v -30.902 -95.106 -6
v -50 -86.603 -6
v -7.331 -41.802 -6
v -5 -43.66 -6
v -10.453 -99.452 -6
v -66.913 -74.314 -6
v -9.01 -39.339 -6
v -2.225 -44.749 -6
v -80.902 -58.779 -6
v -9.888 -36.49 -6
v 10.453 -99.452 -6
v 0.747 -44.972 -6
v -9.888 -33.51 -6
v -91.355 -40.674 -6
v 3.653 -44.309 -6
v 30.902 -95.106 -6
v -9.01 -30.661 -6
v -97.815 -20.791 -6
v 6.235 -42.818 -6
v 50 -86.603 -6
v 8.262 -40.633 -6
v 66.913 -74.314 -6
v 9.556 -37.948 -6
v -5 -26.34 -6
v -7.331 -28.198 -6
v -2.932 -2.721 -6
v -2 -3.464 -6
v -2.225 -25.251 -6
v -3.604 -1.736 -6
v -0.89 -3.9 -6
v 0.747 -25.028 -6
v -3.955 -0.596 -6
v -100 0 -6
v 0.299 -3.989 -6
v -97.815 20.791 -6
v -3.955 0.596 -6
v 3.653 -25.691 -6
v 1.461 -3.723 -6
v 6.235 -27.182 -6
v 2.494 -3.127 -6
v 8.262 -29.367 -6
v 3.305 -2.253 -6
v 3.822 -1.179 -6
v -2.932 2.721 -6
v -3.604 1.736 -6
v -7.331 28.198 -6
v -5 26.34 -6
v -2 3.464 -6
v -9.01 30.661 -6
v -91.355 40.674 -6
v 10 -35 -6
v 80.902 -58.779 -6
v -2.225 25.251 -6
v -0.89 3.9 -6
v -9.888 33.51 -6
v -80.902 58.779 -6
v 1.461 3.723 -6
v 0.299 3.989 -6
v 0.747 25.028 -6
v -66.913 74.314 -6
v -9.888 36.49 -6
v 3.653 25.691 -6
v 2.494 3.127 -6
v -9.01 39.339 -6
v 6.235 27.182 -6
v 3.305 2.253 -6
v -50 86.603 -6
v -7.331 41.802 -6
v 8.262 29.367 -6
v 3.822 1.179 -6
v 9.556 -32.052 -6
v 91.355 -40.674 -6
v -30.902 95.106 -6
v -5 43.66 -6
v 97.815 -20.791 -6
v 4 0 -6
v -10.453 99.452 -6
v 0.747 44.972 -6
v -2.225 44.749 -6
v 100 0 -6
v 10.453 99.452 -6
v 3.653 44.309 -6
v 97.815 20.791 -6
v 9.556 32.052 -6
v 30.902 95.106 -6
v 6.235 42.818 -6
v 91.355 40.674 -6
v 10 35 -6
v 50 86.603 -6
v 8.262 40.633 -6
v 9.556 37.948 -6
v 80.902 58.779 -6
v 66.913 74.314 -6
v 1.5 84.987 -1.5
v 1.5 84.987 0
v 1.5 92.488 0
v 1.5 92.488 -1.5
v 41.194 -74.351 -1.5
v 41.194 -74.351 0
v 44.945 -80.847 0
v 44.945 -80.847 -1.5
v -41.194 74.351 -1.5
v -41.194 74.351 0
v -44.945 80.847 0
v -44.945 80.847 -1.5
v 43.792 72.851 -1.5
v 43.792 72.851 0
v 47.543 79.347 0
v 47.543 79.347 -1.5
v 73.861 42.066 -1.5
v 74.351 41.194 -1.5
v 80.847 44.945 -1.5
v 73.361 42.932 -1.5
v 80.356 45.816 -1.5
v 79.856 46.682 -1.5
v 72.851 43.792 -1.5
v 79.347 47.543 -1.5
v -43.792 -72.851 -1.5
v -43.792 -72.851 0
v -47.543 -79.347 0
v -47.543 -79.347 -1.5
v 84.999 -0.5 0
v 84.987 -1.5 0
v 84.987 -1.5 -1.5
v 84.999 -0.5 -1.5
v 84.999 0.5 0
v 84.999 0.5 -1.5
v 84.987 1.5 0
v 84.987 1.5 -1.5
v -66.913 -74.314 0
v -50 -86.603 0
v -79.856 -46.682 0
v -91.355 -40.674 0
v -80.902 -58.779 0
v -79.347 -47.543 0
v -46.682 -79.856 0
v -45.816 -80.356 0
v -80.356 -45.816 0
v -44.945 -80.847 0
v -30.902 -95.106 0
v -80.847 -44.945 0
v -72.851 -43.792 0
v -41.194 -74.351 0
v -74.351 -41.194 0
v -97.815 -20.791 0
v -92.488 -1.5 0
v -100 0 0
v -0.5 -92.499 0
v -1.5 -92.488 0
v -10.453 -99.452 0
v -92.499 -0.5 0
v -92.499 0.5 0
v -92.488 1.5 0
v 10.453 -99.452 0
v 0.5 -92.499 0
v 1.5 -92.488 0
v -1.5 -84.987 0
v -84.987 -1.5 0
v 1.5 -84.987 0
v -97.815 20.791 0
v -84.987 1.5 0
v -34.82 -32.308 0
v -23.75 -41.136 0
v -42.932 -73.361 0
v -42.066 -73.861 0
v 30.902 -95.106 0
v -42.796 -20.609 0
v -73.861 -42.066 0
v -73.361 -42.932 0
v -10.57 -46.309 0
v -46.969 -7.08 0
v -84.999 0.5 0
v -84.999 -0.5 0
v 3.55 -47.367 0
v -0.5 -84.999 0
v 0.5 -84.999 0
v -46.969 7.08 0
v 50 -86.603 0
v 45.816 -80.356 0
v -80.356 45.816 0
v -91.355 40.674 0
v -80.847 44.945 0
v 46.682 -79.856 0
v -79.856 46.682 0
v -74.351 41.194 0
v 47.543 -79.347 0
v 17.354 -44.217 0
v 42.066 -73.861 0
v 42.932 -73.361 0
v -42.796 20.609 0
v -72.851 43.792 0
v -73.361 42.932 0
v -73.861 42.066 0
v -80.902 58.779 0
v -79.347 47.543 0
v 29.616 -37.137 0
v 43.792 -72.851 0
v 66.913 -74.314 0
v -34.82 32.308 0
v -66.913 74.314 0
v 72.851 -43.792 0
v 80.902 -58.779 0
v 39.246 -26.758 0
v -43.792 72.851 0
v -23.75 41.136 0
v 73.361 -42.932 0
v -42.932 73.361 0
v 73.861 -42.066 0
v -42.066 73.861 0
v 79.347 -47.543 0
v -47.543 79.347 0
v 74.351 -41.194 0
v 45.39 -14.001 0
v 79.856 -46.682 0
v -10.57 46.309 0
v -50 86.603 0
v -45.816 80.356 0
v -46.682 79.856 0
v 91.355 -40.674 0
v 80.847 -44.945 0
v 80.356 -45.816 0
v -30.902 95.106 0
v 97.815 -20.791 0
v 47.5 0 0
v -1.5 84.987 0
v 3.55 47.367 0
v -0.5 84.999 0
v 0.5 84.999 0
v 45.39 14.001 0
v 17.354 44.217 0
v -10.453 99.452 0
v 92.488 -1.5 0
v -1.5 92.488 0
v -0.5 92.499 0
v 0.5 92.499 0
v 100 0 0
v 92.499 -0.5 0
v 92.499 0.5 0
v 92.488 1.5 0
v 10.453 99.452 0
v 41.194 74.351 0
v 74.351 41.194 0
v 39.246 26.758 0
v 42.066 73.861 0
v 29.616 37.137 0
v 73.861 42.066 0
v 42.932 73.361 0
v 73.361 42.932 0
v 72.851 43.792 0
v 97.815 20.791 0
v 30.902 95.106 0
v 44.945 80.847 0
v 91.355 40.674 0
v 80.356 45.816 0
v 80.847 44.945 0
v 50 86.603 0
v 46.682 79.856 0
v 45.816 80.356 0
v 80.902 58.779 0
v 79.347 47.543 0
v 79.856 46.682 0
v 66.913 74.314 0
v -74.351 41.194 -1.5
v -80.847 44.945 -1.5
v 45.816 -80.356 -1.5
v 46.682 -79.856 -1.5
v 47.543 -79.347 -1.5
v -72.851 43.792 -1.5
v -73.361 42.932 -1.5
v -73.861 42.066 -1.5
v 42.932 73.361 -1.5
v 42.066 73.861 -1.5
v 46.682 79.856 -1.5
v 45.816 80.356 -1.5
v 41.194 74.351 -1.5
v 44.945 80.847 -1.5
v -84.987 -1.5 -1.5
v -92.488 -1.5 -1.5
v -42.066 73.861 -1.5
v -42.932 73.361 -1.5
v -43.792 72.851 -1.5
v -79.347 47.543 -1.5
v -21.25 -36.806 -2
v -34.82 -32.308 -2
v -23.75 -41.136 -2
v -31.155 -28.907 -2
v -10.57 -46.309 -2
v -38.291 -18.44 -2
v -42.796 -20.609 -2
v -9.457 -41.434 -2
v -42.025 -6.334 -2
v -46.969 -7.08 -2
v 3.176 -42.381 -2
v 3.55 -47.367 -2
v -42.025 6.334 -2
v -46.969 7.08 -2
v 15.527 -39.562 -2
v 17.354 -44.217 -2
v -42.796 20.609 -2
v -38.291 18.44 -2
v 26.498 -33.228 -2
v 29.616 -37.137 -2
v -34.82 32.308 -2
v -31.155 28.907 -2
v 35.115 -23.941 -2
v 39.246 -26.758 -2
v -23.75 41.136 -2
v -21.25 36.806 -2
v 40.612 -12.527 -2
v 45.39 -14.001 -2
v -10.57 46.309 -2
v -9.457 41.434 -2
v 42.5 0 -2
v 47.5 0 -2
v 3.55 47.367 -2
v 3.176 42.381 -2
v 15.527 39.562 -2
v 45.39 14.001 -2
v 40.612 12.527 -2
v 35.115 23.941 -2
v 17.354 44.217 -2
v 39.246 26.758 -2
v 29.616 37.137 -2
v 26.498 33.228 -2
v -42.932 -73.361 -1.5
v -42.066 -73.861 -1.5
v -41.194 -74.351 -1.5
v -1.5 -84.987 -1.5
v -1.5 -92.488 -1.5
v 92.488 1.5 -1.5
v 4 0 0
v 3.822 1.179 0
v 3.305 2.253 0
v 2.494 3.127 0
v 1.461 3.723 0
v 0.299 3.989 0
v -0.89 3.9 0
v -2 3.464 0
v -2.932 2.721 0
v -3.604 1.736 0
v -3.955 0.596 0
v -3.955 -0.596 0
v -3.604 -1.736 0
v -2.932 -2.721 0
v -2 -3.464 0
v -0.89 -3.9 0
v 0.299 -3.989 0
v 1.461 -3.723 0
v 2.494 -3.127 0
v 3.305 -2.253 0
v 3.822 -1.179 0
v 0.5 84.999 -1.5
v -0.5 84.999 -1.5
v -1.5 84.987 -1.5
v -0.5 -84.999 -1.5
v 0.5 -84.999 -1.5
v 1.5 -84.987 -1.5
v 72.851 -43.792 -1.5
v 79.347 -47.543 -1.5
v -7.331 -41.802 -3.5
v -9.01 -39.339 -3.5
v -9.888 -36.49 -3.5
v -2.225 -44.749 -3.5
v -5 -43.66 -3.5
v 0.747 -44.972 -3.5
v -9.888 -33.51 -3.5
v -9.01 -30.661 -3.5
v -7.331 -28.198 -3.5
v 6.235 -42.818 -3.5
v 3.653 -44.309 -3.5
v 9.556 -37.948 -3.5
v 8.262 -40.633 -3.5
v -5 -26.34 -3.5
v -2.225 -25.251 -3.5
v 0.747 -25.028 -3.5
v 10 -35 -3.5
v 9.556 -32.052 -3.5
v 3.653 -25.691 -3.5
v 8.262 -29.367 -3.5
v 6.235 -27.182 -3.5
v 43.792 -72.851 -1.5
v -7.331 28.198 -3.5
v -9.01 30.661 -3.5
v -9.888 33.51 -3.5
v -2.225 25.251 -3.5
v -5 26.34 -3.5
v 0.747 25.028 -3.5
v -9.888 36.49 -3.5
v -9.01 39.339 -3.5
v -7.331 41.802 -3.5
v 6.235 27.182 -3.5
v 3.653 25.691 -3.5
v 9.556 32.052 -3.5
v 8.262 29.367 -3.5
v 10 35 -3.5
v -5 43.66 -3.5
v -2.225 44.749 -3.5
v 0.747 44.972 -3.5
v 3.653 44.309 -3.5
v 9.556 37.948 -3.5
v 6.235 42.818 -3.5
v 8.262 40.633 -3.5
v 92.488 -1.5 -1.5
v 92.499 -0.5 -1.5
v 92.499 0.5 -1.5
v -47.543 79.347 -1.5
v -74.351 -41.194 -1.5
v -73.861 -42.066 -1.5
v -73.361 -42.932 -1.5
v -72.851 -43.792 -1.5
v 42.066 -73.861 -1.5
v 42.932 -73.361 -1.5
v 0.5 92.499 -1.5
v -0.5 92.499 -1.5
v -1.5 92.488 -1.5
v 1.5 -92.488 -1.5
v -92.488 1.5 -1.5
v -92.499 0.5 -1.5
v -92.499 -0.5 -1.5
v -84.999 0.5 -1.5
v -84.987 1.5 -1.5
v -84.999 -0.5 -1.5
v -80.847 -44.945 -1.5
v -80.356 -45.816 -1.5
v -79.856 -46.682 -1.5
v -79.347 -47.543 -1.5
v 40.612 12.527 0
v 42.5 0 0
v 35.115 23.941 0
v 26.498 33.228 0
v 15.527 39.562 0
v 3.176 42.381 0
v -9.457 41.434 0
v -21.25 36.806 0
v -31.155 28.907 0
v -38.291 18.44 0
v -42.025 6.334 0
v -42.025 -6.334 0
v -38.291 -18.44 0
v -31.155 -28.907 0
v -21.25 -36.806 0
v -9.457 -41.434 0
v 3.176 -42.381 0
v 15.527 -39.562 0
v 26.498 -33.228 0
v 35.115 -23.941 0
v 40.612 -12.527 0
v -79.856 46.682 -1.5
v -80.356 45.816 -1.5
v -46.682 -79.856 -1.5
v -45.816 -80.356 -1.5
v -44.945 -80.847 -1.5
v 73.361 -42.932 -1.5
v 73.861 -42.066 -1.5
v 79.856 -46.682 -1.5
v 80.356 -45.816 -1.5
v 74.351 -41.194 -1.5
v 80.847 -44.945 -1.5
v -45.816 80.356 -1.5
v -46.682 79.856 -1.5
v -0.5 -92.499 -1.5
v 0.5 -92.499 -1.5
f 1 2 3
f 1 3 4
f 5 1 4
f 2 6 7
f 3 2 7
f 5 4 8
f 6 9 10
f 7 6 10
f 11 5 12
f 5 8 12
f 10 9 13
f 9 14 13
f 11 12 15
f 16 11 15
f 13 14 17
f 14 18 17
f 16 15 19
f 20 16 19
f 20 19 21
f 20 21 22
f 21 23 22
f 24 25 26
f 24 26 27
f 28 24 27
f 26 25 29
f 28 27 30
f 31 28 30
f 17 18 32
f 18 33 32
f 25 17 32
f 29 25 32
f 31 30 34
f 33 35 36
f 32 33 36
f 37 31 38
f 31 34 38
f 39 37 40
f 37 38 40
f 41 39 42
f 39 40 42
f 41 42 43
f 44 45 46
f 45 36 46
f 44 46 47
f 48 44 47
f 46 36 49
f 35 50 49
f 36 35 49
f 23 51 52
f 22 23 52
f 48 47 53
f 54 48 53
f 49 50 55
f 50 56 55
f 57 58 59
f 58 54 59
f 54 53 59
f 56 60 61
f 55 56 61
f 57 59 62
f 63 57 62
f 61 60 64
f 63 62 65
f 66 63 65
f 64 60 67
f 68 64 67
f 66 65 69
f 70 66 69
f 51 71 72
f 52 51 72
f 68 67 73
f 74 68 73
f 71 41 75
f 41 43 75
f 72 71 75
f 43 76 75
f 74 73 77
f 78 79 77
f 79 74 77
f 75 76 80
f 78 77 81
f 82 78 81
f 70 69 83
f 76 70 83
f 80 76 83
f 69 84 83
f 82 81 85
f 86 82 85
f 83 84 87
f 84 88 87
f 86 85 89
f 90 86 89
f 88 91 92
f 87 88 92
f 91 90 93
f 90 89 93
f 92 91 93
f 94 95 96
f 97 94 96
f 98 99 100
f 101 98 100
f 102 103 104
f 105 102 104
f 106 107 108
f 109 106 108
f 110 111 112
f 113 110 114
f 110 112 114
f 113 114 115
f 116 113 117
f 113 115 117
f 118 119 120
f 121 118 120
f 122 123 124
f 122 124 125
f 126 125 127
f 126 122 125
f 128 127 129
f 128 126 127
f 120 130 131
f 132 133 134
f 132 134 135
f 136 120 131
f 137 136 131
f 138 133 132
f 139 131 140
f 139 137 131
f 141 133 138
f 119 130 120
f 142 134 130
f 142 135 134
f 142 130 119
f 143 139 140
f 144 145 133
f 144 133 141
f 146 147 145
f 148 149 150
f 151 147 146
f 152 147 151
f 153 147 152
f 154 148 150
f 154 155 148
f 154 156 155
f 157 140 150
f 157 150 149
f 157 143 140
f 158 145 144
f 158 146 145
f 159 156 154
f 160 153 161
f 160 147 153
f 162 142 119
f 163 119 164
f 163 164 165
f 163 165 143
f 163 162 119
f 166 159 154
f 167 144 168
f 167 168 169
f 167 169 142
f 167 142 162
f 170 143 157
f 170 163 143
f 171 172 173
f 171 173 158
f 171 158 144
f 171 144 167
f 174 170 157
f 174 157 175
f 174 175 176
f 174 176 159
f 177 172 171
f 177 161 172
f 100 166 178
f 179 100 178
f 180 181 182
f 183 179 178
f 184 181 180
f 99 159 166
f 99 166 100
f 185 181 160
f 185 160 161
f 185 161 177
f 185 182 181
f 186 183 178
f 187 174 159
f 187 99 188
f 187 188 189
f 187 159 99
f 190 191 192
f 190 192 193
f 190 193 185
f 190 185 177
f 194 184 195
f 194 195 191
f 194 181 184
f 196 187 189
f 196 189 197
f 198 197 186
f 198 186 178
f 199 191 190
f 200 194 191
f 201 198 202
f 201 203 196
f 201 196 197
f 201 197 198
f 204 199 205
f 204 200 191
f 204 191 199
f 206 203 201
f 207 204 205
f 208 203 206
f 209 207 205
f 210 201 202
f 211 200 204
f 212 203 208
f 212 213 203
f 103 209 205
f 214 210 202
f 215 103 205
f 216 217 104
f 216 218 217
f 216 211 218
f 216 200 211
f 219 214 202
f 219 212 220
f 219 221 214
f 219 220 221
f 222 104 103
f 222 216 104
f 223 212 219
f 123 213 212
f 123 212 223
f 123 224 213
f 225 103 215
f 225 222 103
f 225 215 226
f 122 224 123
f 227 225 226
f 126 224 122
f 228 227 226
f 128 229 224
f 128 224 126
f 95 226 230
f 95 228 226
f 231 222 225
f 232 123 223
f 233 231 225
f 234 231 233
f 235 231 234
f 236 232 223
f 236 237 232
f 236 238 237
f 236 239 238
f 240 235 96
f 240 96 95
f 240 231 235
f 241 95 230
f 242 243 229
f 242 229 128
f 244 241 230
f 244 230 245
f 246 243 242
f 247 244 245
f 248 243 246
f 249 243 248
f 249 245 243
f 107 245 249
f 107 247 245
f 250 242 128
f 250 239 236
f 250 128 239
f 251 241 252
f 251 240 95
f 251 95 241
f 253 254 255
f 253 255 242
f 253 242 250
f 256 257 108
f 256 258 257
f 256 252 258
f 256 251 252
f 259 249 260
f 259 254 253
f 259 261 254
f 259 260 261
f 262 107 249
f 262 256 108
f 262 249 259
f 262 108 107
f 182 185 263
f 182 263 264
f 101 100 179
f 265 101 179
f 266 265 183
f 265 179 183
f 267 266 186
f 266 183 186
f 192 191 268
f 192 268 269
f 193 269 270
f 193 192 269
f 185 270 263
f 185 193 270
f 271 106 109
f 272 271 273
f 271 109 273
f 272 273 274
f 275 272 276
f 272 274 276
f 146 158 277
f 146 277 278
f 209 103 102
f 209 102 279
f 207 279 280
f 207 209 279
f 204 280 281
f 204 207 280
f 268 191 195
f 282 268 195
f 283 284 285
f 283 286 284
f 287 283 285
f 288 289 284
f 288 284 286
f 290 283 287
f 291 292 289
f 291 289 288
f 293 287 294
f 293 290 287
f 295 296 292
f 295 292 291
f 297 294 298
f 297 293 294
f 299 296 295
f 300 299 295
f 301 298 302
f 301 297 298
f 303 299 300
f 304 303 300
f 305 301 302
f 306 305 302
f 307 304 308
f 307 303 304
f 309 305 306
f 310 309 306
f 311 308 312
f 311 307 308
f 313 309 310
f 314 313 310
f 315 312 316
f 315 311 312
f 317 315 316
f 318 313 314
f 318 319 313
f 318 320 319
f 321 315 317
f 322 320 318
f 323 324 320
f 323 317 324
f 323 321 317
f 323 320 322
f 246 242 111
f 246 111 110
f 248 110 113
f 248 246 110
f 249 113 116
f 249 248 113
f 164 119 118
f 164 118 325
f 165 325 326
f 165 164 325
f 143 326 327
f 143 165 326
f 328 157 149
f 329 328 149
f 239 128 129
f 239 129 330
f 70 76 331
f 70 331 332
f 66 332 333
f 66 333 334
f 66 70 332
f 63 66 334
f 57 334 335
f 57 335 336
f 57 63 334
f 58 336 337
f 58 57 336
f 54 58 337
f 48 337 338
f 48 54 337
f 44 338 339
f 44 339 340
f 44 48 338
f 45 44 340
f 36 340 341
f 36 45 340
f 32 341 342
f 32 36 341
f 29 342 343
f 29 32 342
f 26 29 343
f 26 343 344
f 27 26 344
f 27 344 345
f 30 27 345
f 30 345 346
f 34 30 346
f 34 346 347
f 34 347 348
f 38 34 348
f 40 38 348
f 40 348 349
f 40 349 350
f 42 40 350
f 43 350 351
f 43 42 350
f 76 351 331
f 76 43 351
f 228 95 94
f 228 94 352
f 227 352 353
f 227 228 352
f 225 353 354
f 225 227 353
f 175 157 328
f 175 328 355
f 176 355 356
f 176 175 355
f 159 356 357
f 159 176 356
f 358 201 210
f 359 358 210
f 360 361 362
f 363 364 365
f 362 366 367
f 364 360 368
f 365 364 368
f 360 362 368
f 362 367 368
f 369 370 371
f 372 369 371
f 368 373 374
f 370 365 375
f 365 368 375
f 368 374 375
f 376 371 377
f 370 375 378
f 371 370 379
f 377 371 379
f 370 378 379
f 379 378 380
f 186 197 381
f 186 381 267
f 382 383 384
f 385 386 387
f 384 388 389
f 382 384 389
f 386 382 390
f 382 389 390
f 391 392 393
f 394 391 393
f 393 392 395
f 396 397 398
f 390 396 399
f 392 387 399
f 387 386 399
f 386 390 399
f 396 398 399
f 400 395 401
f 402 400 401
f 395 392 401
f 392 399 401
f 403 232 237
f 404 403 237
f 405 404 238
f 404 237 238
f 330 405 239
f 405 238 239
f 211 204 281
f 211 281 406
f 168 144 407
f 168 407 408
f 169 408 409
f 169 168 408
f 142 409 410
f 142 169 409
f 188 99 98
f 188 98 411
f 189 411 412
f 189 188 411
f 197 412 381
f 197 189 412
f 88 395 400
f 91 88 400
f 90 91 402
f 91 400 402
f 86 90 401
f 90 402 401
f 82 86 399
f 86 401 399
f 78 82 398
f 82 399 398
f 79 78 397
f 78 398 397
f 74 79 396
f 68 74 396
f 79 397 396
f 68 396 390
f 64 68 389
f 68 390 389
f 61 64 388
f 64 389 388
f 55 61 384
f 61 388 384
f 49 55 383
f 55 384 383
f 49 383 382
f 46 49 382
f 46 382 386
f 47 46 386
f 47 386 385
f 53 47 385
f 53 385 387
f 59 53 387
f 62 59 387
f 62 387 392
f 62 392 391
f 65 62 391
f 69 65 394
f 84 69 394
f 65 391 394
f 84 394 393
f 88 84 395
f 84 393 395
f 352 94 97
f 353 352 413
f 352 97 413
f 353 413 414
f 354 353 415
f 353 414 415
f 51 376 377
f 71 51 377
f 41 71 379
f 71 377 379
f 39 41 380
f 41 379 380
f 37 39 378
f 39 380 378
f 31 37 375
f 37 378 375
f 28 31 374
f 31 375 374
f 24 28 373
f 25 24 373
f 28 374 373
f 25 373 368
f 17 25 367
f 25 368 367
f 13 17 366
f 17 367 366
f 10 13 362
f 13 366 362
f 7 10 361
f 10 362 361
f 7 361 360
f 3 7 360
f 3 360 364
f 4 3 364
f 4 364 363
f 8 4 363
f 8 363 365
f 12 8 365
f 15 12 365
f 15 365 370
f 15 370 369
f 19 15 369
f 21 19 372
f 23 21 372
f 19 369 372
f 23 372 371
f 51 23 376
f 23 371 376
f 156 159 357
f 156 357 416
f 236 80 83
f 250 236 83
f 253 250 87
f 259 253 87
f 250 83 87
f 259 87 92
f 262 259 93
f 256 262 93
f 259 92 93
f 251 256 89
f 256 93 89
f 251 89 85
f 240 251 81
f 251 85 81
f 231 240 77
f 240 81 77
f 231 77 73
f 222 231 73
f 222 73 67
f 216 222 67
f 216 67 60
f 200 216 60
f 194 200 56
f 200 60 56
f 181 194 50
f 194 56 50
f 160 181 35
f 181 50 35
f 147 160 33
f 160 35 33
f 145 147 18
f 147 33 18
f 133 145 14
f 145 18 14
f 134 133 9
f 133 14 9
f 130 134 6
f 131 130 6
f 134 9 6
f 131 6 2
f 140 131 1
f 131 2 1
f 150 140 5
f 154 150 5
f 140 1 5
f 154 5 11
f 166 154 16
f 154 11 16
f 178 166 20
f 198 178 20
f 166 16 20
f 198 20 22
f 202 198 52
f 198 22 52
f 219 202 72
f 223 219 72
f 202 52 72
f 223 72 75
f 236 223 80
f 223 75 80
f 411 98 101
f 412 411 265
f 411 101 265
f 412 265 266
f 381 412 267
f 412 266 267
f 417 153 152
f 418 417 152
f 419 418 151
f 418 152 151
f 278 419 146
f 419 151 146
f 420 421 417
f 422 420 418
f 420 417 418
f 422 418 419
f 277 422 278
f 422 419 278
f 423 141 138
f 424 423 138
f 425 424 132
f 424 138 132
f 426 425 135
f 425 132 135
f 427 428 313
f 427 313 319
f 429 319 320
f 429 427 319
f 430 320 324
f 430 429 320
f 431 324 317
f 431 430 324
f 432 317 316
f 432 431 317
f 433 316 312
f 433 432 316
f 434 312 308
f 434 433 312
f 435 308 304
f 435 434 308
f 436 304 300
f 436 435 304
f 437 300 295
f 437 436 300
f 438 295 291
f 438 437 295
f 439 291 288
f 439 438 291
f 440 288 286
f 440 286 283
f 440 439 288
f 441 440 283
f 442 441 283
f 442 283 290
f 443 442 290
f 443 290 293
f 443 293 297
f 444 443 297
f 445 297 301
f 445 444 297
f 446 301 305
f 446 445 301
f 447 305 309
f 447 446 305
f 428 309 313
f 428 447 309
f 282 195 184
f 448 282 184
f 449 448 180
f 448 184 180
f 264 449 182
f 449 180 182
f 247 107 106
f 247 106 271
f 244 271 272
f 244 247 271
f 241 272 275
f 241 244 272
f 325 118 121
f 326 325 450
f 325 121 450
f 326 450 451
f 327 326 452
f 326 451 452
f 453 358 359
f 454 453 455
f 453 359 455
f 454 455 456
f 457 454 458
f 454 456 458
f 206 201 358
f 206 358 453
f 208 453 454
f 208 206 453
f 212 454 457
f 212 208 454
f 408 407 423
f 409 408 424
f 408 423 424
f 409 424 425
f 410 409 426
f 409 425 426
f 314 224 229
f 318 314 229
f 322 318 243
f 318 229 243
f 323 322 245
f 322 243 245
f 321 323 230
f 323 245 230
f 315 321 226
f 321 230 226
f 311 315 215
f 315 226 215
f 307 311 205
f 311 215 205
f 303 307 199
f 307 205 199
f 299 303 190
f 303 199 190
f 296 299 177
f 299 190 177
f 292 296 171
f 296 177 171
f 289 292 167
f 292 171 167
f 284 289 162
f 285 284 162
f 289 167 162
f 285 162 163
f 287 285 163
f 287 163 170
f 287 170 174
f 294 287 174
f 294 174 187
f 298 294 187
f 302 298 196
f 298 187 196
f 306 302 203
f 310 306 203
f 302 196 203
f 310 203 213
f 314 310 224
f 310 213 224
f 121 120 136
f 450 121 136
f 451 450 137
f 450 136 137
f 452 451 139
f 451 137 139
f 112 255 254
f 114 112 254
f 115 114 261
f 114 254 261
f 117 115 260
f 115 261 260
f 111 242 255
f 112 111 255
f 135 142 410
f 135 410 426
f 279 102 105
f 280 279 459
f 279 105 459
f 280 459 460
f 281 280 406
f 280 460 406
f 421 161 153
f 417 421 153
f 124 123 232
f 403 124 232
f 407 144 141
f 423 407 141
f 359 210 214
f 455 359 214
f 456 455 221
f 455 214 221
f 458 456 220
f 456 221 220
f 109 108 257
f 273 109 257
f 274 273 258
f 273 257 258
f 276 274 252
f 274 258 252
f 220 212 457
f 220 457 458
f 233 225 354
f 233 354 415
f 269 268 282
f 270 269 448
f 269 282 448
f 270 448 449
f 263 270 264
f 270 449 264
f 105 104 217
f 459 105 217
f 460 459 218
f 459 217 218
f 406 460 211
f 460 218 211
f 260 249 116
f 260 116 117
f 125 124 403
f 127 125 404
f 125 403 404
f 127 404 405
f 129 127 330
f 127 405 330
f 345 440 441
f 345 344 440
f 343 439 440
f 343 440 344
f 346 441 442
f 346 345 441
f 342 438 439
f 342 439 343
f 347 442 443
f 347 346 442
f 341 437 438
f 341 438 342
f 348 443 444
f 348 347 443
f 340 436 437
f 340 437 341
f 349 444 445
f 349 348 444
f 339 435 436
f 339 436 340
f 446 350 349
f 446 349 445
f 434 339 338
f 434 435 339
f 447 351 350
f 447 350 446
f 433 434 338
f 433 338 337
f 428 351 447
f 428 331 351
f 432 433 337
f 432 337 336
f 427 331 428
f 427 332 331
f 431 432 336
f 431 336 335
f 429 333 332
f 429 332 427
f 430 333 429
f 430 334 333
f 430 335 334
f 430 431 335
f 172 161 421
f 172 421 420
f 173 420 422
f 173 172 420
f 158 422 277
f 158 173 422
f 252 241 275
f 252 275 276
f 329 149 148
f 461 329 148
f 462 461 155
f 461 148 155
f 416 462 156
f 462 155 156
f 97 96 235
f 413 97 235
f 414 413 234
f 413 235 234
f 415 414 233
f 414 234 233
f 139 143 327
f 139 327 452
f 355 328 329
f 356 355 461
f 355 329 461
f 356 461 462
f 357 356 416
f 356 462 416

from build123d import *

# Parameters (mm, degrees)
EXTRUDE003_DEPTH = 1.5
ARRAY001_COUNT   = 12
SKETCH017_R      = 47.5
SKETCH017_R_2    = 42.5
EXTRUDE002_DEPTH = 2
SKETCH021_R      = 10
EXTRUDE004_DEPTH = 2.5
TUBE001_R        = 100
TUBE001_R_2      = 4
TUBE001_DEPTH    = 6


with BuildPart() as tenminutemarksarray:
    # Sketch014 → Extrude003 (new body)
    with BuildSketch(Plane.XY):
        with BuildLine():
            Line((-1.5, 84.986764), (-1.5, 92.487837))
            ThreePointArc((1.5, 92.487837), (0, 92.5), (-1.5, 92.487837))
            Line((1.5, 84.986764), (1.5, 92.487837))
            ThreePointArc((1.5, 84.986764), (0, 85), (-1.5, 84.986764))
        make_face()
    extrude(amount=-EXTRUDE003_DEPTH)

    # Array001: TenMinuteMarksArray ×12 about axis
    array001_axis = Axis((0, 0, 0), (0, 0, 1))


with BuildPart() as tenminutemarksarray_1:
    add(tenminutemarksarray.part)
    for i in range(1, ARRAY001_COUNT):
        add(tenminutemarksarray.part.rotate(array001_axis, i * 360 / ARRAY001_COUNT))


with BuildPart() as brassinlaycutout:
    # Sketch017 → Extrude002 (new body)
    with BuildSketch(Plane.XY):
        Circle(SKETCH017_R)
        Circle(SKETCH017_R_2, mode=Mode.SUBTRACT)
    extrude(amount=-EXTRUDE002_DEPTH)


with BuildPart() as dialplatecutouts:
    # Sketch021 → Extrude004 (new body)
    with BuildSketch(Plane.XY.offset(-3.5)):
        with Locations((0, 35)):
            Circle(SKETCH021_R)
        with Locations((0, -35)):
            Circle(SKETCH021_R)
    extrude(amount=-EXTRUDE004_DEPTH)

    # Fusion: union TenMinuteMarksArray, BrassInlayCutout
    add(tenminutemarksarray_1.part)
    add(brassinlaycutout.part)


with BuildPart() as dialplate:
    # Tube001 → Tube001 (new body)
    with BuildSketch(Plane.XY.offset(-6)):
        Circle(TUBE001_R)
        Circle(TUBE001_R_2, mode=Mode.SUBTRACT)
    extrude(amount=TUBE001_DEPTH)

    # Cut: cut DialPlateCutouts
    add(dialplatecutouts.part, mode=Mode.SUBTRACT)


solid = dialplate.part
